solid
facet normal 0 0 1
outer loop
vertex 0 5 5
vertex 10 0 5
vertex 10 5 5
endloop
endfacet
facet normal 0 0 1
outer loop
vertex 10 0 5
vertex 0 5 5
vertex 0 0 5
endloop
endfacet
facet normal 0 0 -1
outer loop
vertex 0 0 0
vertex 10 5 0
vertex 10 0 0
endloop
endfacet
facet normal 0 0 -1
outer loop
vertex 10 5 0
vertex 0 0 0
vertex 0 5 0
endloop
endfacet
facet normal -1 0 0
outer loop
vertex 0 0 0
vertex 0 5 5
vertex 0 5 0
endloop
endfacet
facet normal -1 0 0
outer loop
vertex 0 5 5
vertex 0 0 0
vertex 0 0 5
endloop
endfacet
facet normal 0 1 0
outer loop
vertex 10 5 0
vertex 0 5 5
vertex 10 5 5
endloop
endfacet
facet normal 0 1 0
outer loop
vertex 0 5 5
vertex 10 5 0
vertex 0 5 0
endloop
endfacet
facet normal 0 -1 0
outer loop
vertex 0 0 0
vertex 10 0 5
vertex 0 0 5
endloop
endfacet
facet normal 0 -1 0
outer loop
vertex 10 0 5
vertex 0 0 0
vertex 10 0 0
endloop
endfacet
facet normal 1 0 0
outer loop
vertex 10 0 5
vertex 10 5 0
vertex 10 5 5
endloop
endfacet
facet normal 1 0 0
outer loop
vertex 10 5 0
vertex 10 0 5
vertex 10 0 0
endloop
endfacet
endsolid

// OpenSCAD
// two cubes sharing a face
cube(5);
translate([5, 0, 0]) cube(5);
